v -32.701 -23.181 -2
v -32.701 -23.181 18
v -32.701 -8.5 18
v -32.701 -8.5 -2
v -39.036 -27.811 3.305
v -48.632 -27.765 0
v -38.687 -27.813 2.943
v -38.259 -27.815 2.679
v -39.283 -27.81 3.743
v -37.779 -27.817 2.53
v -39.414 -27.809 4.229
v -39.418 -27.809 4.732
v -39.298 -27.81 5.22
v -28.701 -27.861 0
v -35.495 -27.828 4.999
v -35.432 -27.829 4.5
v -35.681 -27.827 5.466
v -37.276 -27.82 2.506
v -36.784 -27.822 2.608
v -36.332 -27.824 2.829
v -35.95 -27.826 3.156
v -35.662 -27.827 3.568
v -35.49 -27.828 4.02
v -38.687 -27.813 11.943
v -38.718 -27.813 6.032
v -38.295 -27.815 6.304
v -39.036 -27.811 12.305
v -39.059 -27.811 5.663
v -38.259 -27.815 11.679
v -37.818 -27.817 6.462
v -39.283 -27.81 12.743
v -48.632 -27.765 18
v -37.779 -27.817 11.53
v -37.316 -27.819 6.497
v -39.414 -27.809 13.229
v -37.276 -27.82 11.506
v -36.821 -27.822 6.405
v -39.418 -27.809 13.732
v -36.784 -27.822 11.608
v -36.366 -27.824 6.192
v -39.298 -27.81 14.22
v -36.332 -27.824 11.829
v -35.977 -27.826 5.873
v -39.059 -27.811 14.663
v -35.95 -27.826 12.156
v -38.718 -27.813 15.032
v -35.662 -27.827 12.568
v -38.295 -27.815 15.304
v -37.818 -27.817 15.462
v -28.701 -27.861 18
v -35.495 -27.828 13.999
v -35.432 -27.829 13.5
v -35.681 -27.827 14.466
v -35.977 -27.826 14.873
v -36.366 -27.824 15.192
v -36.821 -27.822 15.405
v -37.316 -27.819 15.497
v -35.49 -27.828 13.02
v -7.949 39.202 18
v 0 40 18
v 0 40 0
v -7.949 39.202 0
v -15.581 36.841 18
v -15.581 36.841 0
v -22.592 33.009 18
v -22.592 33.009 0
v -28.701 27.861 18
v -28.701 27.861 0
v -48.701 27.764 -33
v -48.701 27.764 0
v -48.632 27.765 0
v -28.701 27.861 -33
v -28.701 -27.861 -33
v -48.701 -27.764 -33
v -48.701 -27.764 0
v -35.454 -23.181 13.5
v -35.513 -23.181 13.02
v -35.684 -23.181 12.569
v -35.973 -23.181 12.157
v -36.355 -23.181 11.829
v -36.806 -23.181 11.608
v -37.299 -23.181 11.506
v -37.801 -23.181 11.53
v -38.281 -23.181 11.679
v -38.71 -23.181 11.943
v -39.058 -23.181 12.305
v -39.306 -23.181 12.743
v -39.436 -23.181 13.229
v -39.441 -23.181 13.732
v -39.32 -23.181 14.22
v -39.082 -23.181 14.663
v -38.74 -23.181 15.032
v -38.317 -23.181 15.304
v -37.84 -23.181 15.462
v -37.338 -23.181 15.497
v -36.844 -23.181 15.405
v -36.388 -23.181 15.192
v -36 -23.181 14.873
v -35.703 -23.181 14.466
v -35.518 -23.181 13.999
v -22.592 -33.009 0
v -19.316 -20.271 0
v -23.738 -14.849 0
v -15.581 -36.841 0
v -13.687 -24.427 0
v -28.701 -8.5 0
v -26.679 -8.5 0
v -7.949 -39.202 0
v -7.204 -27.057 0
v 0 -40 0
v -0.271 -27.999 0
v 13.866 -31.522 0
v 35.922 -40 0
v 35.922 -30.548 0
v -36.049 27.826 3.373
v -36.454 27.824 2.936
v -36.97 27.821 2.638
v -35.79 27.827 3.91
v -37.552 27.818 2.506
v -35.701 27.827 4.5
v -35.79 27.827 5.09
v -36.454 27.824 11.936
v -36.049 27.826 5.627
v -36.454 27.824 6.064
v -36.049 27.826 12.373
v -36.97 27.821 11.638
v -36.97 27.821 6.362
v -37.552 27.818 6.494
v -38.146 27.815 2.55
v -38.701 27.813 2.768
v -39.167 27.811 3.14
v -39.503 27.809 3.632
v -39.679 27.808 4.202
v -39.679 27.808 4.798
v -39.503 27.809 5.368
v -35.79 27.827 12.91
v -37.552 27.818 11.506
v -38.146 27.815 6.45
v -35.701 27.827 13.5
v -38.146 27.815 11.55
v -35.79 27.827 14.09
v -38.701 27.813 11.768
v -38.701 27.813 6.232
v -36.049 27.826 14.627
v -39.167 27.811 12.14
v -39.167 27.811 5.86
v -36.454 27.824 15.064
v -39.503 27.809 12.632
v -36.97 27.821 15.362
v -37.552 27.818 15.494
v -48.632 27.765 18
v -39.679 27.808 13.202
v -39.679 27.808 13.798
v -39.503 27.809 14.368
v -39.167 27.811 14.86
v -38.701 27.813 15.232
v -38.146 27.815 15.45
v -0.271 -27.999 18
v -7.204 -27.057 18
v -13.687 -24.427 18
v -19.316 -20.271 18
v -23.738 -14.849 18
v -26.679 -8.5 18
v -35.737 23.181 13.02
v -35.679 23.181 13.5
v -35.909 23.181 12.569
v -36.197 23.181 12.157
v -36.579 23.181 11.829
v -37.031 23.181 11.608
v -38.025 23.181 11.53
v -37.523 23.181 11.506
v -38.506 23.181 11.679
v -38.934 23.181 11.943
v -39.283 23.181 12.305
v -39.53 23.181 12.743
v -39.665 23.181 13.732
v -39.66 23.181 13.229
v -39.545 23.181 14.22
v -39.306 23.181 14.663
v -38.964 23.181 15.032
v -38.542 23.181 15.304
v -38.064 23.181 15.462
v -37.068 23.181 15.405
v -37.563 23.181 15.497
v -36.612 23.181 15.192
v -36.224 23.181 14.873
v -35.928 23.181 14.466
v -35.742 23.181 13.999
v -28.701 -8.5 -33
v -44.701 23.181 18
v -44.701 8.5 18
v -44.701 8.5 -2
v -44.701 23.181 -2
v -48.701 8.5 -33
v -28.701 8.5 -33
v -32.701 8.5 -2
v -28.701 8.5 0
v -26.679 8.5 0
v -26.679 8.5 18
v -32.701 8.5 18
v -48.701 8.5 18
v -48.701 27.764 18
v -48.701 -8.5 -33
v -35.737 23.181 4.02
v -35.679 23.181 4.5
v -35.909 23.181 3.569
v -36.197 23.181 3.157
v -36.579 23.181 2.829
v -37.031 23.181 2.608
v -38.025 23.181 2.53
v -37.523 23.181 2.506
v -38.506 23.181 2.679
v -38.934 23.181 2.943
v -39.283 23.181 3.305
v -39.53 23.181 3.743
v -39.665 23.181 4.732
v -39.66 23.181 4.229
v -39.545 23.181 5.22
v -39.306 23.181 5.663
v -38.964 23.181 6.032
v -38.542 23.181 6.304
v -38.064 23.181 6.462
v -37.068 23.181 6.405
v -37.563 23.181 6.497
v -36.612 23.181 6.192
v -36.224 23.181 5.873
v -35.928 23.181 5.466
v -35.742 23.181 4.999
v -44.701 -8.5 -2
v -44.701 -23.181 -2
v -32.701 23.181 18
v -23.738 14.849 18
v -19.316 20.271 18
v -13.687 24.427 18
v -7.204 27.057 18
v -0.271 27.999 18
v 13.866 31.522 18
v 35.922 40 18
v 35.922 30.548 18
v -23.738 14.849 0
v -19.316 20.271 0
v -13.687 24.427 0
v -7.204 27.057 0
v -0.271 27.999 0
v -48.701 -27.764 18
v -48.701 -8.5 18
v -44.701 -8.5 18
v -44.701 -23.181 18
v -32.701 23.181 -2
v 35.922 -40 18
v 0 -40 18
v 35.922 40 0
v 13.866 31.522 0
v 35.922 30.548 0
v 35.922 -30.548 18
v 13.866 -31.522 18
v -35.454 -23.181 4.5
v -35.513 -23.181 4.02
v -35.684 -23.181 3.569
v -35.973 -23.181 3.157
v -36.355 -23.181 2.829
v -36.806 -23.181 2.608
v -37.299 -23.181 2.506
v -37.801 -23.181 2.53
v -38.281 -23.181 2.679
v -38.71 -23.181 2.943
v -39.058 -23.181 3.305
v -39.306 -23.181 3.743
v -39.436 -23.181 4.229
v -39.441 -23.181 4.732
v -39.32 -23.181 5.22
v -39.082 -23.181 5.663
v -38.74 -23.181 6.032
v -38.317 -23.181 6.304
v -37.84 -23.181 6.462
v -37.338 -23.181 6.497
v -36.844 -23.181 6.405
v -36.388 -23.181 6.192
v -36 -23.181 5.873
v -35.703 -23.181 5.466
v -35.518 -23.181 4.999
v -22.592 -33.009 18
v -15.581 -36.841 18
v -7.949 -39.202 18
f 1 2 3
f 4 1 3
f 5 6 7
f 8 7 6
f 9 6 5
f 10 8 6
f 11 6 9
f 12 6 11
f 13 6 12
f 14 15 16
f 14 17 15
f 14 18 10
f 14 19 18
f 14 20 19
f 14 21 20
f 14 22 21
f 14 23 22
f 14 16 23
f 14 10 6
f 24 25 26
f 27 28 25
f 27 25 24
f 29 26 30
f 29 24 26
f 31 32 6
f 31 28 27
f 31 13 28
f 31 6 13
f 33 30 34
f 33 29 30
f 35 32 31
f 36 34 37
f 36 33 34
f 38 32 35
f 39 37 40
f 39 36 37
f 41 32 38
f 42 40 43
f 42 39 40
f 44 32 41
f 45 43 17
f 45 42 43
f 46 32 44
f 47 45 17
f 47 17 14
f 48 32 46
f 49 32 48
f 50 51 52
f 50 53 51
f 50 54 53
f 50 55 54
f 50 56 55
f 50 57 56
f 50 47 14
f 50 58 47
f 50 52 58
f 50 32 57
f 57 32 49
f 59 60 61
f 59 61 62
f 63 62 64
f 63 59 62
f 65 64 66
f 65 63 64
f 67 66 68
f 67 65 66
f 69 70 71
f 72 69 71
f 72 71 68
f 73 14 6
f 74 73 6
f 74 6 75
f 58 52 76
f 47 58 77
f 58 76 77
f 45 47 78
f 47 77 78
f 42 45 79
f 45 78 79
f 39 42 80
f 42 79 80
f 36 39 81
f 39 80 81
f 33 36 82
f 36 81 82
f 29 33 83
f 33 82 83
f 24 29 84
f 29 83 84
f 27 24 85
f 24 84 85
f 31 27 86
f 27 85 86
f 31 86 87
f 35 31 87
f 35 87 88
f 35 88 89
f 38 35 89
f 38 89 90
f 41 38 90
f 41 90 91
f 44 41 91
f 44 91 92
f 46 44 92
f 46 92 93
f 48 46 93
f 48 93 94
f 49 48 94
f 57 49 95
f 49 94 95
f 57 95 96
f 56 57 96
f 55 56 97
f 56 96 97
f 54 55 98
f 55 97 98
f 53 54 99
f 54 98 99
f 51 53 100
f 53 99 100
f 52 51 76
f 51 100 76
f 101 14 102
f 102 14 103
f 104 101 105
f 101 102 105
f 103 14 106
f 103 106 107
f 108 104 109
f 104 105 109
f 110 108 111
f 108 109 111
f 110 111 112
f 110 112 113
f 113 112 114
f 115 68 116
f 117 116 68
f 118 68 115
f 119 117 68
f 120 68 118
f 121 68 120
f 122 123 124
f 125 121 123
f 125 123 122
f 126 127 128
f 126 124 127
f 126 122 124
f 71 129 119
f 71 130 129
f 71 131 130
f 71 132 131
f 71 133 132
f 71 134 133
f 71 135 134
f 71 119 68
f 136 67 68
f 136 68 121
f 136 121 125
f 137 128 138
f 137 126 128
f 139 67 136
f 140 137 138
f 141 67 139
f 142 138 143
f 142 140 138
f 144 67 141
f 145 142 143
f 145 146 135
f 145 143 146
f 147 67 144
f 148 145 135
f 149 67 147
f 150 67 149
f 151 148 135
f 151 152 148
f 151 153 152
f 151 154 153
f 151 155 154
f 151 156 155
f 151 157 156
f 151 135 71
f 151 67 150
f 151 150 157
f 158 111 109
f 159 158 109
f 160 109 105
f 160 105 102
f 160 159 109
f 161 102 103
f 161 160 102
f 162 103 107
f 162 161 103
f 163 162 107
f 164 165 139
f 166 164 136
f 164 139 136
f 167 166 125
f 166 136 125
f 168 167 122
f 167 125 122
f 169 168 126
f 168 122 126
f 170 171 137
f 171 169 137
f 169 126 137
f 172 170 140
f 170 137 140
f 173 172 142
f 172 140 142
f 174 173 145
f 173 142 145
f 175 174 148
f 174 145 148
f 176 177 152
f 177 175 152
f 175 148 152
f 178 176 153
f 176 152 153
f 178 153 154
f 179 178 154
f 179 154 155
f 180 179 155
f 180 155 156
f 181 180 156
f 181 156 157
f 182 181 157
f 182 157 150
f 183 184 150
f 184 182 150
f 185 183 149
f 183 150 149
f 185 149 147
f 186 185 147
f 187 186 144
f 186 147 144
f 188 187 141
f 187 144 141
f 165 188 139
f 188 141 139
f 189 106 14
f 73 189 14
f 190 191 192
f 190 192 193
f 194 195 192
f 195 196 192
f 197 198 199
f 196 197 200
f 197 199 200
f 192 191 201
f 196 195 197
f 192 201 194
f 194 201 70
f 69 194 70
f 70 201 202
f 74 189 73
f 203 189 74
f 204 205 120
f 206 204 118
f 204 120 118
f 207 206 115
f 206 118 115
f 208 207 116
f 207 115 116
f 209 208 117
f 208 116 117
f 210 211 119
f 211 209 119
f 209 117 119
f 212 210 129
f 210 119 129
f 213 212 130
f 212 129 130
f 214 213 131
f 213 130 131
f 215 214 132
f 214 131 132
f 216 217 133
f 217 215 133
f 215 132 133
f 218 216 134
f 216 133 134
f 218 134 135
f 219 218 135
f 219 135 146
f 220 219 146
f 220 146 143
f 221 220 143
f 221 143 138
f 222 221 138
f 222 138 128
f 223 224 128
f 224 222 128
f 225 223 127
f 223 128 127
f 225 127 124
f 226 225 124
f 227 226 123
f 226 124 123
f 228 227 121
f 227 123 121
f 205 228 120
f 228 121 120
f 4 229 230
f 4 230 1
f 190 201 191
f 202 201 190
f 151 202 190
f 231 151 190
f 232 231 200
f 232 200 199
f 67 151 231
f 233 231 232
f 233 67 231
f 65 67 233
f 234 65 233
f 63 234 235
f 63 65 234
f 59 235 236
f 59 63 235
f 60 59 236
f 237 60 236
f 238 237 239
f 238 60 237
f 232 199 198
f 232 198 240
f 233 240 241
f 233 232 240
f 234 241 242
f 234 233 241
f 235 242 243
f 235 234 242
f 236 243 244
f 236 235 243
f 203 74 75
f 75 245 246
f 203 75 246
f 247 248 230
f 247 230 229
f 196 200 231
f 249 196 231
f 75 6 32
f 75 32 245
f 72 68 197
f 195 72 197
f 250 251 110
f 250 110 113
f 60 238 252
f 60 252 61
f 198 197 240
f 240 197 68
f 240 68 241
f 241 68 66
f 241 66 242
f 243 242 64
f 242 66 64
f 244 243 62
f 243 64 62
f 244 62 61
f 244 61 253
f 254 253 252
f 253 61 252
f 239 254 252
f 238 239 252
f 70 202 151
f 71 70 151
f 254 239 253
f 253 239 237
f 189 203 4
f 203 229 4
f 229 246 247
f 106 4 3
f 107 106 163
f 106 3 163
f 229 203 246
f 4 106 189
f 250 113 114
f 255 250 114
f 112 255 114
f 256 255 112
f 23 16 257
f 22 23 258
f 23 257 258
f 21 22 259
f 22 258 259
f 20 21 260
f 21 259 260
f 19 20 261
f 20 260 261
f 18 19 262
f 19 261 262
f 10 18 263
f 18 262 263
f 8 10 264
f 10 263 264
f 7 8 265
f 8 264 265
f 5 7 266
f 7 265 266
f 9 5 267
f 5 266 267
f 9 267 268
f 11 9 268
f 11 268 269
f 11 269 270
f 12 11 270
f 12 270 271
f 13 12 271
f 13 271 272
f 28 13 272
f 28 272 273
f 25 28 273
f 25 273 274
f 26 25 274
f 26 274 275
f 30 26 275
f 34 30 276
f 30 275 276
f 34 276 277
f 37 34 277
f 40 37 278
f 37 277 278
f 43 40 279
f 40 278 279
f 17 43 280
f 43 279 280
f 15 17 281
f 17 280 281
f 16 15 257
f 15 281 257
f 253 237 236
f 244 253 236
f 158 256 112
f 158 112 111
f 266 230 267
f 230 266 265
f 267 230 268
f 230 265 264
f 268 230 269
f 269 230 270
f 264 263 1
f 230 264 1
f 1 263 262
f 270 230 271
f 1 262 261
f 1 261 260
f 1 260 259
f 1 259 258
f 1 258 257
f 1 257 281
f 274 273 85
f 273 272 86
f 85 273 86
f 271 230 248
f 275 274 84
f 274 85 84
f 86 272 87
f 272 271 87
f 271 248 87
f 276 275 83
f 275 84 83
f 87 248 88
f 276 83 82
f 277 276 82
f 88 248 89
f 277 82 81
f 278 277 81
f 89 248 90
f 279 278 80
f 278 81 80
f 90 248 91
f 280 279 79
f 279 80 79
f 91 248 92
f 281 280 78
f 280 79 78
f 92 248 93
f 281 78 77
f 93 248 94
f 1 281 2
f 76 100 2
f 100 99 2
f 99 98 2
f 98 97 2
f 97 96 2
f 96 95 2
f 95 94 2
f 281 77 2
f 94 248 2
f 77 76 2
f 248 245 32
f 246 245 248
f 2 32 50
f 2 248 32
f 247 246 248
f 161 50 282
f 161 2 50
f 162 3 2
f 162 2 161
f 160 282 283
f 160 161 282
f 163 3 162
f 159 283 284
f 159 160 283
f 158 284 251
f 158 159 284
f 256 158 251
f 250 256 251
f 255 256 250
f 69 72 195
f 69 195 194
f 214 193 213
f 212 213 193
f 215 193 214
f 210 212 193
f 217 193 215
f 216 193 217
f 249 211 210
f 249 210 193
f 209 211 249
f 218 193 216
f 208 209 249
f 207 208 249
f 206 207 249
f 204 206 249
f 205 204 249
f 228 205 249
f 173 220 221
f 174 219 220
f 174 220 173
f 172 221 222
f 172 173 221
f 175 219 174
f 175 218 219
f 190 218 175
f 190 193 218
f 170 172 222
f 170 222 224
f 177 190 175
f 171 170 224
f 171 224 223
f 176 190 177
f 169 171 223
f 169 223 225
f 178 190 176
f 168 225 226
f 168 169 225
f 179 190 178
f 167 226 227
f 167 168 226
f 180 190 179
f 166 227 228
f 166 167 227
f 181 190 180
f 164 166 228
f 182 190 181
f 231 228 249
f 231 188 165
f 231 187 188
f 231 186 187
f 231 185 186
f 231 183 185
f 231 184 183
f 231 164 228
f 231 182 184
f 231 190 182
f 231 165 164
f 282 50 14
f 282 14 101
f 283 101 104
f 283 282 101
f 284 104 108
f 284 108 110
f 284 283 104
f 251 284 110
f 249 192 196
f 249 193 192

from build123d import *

# Parameters (mm, degrees)
BOSS_EXTRUDE1_DEPTH   = 18
BOSS_EXTRUDE1_2_DEPTH = 18
SKETCH3_R             = 2
CUT_EXTRUDE2_DEPTH    = 55
BOSS_EXTRUDE3_DEPTH   = 8
SKETCH6_W             = 20
SKETCH6_H             = 4
BOSS_EXTRUDE4_DEPTH   = 8
BOSS_EXTRUDE5_DEPTH   = 33
BOSS_EXTRUDE6_DEPTH   = 18
CUT_EXTRUDE3_DEPTH    = 18
FILLET1_R             = 5
CUT_EXTRUDE4_DEPTH    = 18
BOSS_EXTRUDE7_DEPTH   = 18
CUT_EXTRUDE6_DEPTH    = 18
CUT_EXTRUDE8_DEPTH    = 51
BOSS_EXTRUDE9_DEPTH   = 33
CUT_EXTRUDE9_DEPTH    = 51
SKETCH24_W            = 12
SKETCH24_H            = 10
CUT_EXTRUDE13_DEPTH   = 20
CUT_EXTRUDE14_REACH   = 70.173
SKETCH27_R            = 2
SKETCH28_W            = 12
SKETCH28_H            = 26.361153364
CUT_EXTRUDE15_DEPTH   = 20
CUT_EXTRUDE16_DEPTH   = 18


with BuildPart() as part:
    # Sketch1 → Boss-Extrude1 (new body)
    with BuildSketch(Plane.XY):
        with BuildLine():
            ThreePointArc((-67.970581872, 8.5), (-45.332107827, 51.354162441), (0, 68.5))
            Line((0, 68.5), (60, 68.5))
            Line((60, 68.5), (60, 83.5))
            Line((60, 83.5), (0, 83.5))
            ThreePointArc((0, 83.5), (-46.291853863, 69.493267774), (-77.053226258, 32.172197985))
            ThreePointArc((-77.053226258, 32.172197985), (-79.853331001, 28.774985947), (-84.067123478, 27.5))
            Line((-84.067123478, 27.5), (-103.3555905, 27.5))
            Line((-103.3555905, 27.5), (-103.3555905, 21.5))
            Line((-103.3555905, 21.5), (-83.3555905, 21.5))
            Line((-83.3555905, 21.5), (-83.3555905, 13.5))
            Line((-83.3555905, 13.5), (-103.3555905, 13.5))
            Line((-103.3555905, 13.5), (-103.3555905, 8.5))
            Line((-103.3555905, 8.5), (-67.970581872, 8.5))
        make_face()
    extrude(amount=BOSS_EXTRUDE1_DEPTH)


with BuildPart() as body_2:
    # Sketch1 → Boss-Extrude1 2 (new body)
    with BuildSketch(Plane.XY):
        with BuildLine():
            ThreePointArc((-77.053226258, -32.172197985), (-46.291853863, -69.493267774), (0, -83.5))
            Line((0, -83.5), (60, -83.5))
            Line((60, -83.5), (60, -68.5))
            Line((60, -68.5), (0, -68.5))
            ThreePointArc((0, -68.5), (-45.332107827, -51.354162441), (-67.970581872, -8.5))
            Line((-67.970581872, -8.5), (-103.3555905, -8.5))
            Line((-103.3555905, -8.5), (-103.3555905, -13.5))
            Line((-103.3555905, -13.5), (-83.3555905, -13.5))
            Line((-83.3555905, -13.5), (-83.3555905, -21.5))
            Line((-83.3555905, -21.5), (-103.3555905, -21.5))
            Line((-103.3555905, -21.5), (-103.3555905, -27.5))
            Line((-103.3555905, -27.5), (-84.067123478, -27.5))
            ThreePointArc((-84.067123478, -27.5), (-79.853331001, -28.774985947), (-77.053226258, -32.172197985))
        make_face()
    extrude(amount=BOSS_EXTRUDE1_2_DEPTH)


with BuildPart() as cut_extrude2_tool:
    # Sketch3 → Cut-Extrude2 (new body)
    with BuildSketch(Plane.XZ.offset(27.5)):
        with Locations((-88.567123478, 9)):
            Circle(SKETCH3_R)
        with Locations((-97.567123478, 9)):
            Circle(SKETCH3_R)
    extrude(amount=-CUT_EXTRUDE2_DEPTH)


with BuildPart() as part_1:
    add(part.part)

    # Cut-Extrude2: cut by cut_extrude2_tool
    add(cut_extrude2_tool.part, mode=Mode.SUBTRACT)

    # Sketch5 → Boss-Extrude3 (add)
    with BuildSketch(Plane.XZ.offset(-21.5)):
        Polygon((-103.3555905, 14), (-84.067123478, 14), (-83.3555905, 14), (-83.3555905, 18), (-103.3555905, 18), align=None)
        Polygon((-103.3555905, 4), (-103.3555905, 0), (-84.067123478, 0), (-83.3555905, 0), (-83.3555905, 4), (-84.067123478, 4), align=None)
    extrude(amount=BOSS_EXTRUDE3_DEPTH)



with BuildPart() as body_2_1:
    add(body_2.part)

    # Cut-Extrude2: cut by cut_extrude2_tool
    add(cut_extrude2_tool.part, mode=Mode.SUBTRACT)

    # Sketch6 → Boss-Extrude4 (add)
    with BuildSketch(Plane(origin=(0, -13.5, 0), x_dir=(-1, 0, 0), z_dir=(0, -1, 0))):
        with Locations((93.3555905, -16)):
            Rectangle(SKETCH6_W, SKETCH6_H)
        with Locations((93.3555905, -2)):
            Rectangle(SKETCH6_W, SKETCH6_H)
    extrude(amount=BOSS_EXTRUDE4_DEPTH)


with BuildPart() as part_2:
    add(part_1.part)

    add(body_2_1.part)  # Boss-Extrude5 merges body 2
    # Sketch7 → Boss-Extrude5 (add)
    with BuildSketch(Plane(origin=(0, 0, 0), x_dir=(-1, 0, 0), z_dir=(0, 0, -1))):
        with BuildLine():
            Line((67.970581872, -8.5), (103.3555905, -8.5))
            Line((103.3555905, -8.5), (103.3555905, -27.5))
            Line((103.3555905, -27.5), (62.737548565, -27.5))
            ThreePointArc((62.737548565, -27.5), (66.040925498, -18.189176985), (67.970581872, -8.5))
        make_face()
        with BuildLine():
            Line((103.3555905, 27.5), (62.737548565, 27.5))
            ThreePointArc((62.737548565, 27.5), (66.040925498, 18.189176985), (67.970581872, 8.5))
            Line((67.970581872, 8.5), (103.3555905, 8.5))
            Line((103.3555905, 8.5), (103.3555905, 27.5))
        make_face()
    extrude(amount=BOSS_EXTRUDE5_DEPTH)

    # Sketch9 → Boss-Extrude6 (add)
    with BuildSketch(Plane.XY.offset(18)):
        with BuildLine():
            Line((-67.970581872, 8.5), (-53.326822519, 8.5))
            ThreePointArc((-53.326822519, 8.5), (-35.049964337, 41.079191813), (0, 54))
            Line((0, 54), (60, 54))
            Line((60, 54), (60, 68.5))
            Line((60, 68.5), (0, 68.5))
            ThreePointArc((0, 68.5), (-45.332107827, 51.354162441), (-67.970581872, 8.5))
        make_face()
        with BuildLine():
            Line((0, -54), (60, -54))
            Line((60, -54), (60, -68.5))
            Line((60, -68.5), (0, -68.5))
            ThreePointArc((0, -68.5), (-45.332107827, -51.354162441), (-67.970581872, -8.5))
            Line((-67.970581872, -8.5), (-53.326822519, -8.5))
            ThreePointArc((-53.326822519, -8.5), (-35.049964337, -41.079191813), (0, -54))
        make_face()
    extrude(amount=-BOSS_EXTRUDE6_DEPTH)

    # Sketch10 → Cut-Extrude3 (cut)
    with BuildSketch(Plane.XY.offset(18)):
        with BuildLine():
            ThreePointArc((0, 83.5), (-46.291853863, 69.493267774), (-77.053226258, 32.172197985))
            Line((-77.053226258, 32.172197985), (-66.08479157, 32.172197985))
            ThreePointArc((-66.08479157, 32.172197985), (-38.971742635, 62.317359347), (0, 73.5))
            Line((0, 73.5), (50, 73.5))
            Line((50, 73.5), (60, 73.5))
            Line((60, 73.5), (60, 83.5))
            Line((60, 83.5), (0, 83.5))
        make_face()
        with BuildLine():
            Line((0, -83.5), (60, -83.5))
            Line((60, -83.5), (60, -73.5))
            Line((60, -73.5), (50, -73.5))
            Line((50, -73.5), (0, -73.5))
            ThreePointArc((0, -73.5), (-38.971742635, -62.317359347), (-66.08479157, -32.172197985))
            Line((-66.08479157, -32.172197985), (-77.053226258, -32.172197985))
            ThreePointArc((-77.053226258, -32.172197985), (-46.291853863, -69.493267774), (0, -83.5))
        make_face()
        with BuildLine():
            Line((0, -56), (60, -56))
            Line((60, -56), (60, -54))
            Line((60, -54), (0, -54))
            ThreePointArc((0, -54), (-35.049964337, -41.079191813), (-53.326822519, -8.5))
            Line((-53.326822519, -8.5), (-55.35115175, -8.5))
            ThreePointArc((-55.35115175, -8.5), (-36.469165058, -42.497058722), (0, -56))
        make_face()
        with BuildLine():
            Line((60, 54), (60, 56))
            Line((60, 56), (0, 56))
            ThreePointArc((0, 56), (-36.469165058, 42.497058722), (-55.35115175, 8.5))
            Line((-55.35115175, 8.5), (-53.326822519, 8.5))
            ThreePointArc((-53.326822519, 8.5), (-35.049964337, 41.079191813), (0, 54))
            Line((0, 54), (60, 54))
        make_face()
    extrude(amount=-CUT_EXTRUDE3_DEPTH, mode=Mode.SUBTRACT)

    # Fillet1
    fillet1_edges = [part_2.edges().sort_by_distance(p)[0] for p in [
        (-77.053226258, 32.172197985, 9),
    ]]
    fillet(fillet1_edges, radius=FILLET1_R)

    # Sketch12 → Cut-Extrude4 (cut)
    with BuildSketch(Plane.XY.offset(18)):
        with BuildLine():
            ThreePointArc((-84.067123478, 27.5), (-74.733138383, 28.516658422), (-66.08479157, 32.172197985))
            Line((-66.08479157, 32.172197985), (-74.273414579, 32.172197985))
            ThreePointArc((-74.273414579, 32.172197985), (-76.4262848, 31.684974271), (-78.159583252, 30.318257909))
            ThreePointArc((-78.159583252, 30.318257909), (-80.794448382, 28.24065074), (-84.067123478, 27.5))
        make_face()
        with BuildLine():
            ThreePointArc((-84.067123478, -27.5), (-74.733138383, -28.516658422), (-66.08479157, -32.172197985))
            Line((-66.08479157, -32.172197985), (-77.053226258, -32.172197985))
            ThreePointArc((-77.053226258, -32.172197985), (-79.853331001, -28.774985947), (-84.067123478, -27.5))
        make_face()
    extrude(amount=-CUT_EXTRUDE4_DEPTH, mode=Mode.SUBTRACT)

    # Sketch13 → Boss-Extrude7 (add)
    with BuildSketch(Plane.XY.offset(18)):
        with BuildLine():
            ThreePointArc((-0.27090305, 27.998689461), (-0.13545311, 27.999672363), (0, 28))
            Line((0, 28), (35.921954013, 28))
            Line((35.921954013, 28), (35.921954013, 40))
            Line((35.921954013, 40), (0, 40))
            ThreePointArc((0, 40), (-15.581300739, 36.84050851), (-28.701152124, 27.861153364))
            Line((-28.701152124, 27.861153364), (-59.086442662, 27.714159426))
            Line((-59.086442662, 27.714159426), (-59.086442662, 8.5))
            Line((-59.086442662, 8.5), (-39.086442662, 8.5))
            Line((-39.086442662, 8.5), (-26.678643144, 8.5))
            ThreePointArc((-26.678643144, 8.5), (-16.631873998, 22.525114146), (-0.27090305, 27.998689461))
        make_face()
        with BuildLine():
            Line((35.921954013, -28), (0, -28))
            ThreePointArc((0, -28), (-0.13545311, -27.999672363), (-0.27090305, -27.998689461))
            ThreePointArc((-0.27090305, -27.998689461), (-16.631873998, -22.525114146), (-26.678643144, -8.5))
            Line((-26.678643144, -8.5), (-39.086442662, -8.5))
            Line((-39.086442662, -8.5), (-55.35115175, -8.5))
            ThreePointArc((-55.35115175, -8.5), (-52.876575307, -18.44092687), (-48.632495811, -27.764732147))
            Line((-48.632495811, -27.764732147), (-28.701152124, -27.861153364))
            ThreePointArc((-28.701152124, -27.861153364), (-15.581300739, -36.84050851), (0, -40))
            Line((0, -40), (35.921954013, -40))
            Line((35.921954013, -40), (35.921954013, -28))
        make_face()
    extrude(amount=-BOSS_EXTRUDE7_DEPTH)

    # Sketch14 → Cut-Extrude6 (cut)
    with BuildSketch(Plane.XY.offset(18)):
        with BuildLine():
            Line((60, -40), (0, -40))
            ThreePointArc((0, -40), (-15.581300739, -36.84050851), (-28.701152124, -27.861153364))
            Line((-28.701152124, -27.861153364), (-103.3555905, -27.5))
            Line((-103.3555905, -27.5), (-103.3555905, -78.529731722))
            Line((-103.3555905, -78.529731722), (60, -73.5))
            Line((60, -73.5), (60, -40))
        make_face()
        with BuildLine():
            Line((0, 40), (76.426770392, 40))
            Line((76.426770392, 40), (76.426770392, 83.735898263))
            Line((76.426770392, 83.735898263), (-103.3555905, 83.735898263))
            Line((-103.3555905, 83.735898263), (-103.3555905, 27.5))
            Line((-103.3555905, 27.5), (-28.701152124, 27.861153364))
            ThreePointArc((-28.701152124, 27.861153364), (-15.581300739, 36.84050851), (0, 40))
        make_face()
    extrude(amount=-CUT_EXTRUDE6_DEPTH, mode=Mode.SUBTRACT)

    # Sketch16 → Cut-Extrude8 (cut)
    with BuildSketch(Plane.XY.offset(18)):
        Polygon((-96.511114913, -8.5), (-48.701152124, -8.5), (-48.701152124, 27.76440001), (-96.511114913, 27.533111298), align=None)
        with BuildLine():
            Line((-59.086442662, -27.714159426), (-48.701152124, -27.76440001))
            Line((-48.701152124, -27.76440001), (-48.701152124, -8.5))
            Line((-48.701152124, -8.5), (-96.511114913, -8.5))
            Line((-96.511114913, -8.5), (-96.511114913, -27.5))
            Line((-96.511114913, -27.5), (-84.067123478, -27.5))
            ThreePointArc((-84.067123478, -27.5), (-81.983393161, -27.489607176), (-79.903320582, -27.613454288))
            Line((-79.903320582, -27.613454288), (-59.086442662, -27.714159426))
        make_face()
    extrude(amount=-CUT_EXTRUDE8_DEPTH, mode=Mode.SUBTRACT)

    # Sketch17 → Boss-Extrude9 (add)
    with BuildSketch(Plane(origin=(0, 0, 0), x_dir=(-1, 0, 0), z_dir=(0, 0, -1))):
        Polygon((48.701152124, 8.5), (48.701152124, 27.76440001), (28.701152124, 27.861153364), (28.701152124, 8.5), align=None)
        Polygon((48.701152124, -8.5), (28.701152124, -8.5), (28.701152124, -27.861153364), (48.701152124, -27.76440001), align=None)
    extrude(amount=BOSS_EXTRUDE9_DEPTH)

    # Sketch18 → Cut-Extrude9 (cut)
    with BuildSketch(Plane.XY.offset(18)):
        Polygon((-48.701152124, 27.76440001), (-116.673009187, 35.475699467), (-116.673009187, -41.632003062), (-48.701152124, -27.76440001), align=None)
    extrude(amount=-CUT_EXTRUDE9_DEPTH, mode=Mode.SUBTRACT)

    # Sketch24 → Cut-Extrude13 (cut)
    with BuildSketch(Plane.XY.offset(18)):
        with Locations((-38.701152124, -18.180576682)):
            Rectangle(SKETCH24_W, SKETCH24_H)
        with Locations((-38.701152124, 18.180576682)):
            Rectangle(SKETCH24_W, SKETCH24_H)
    extrude(amount=-CUT_EXTRUDE13_DEPTH, mode=Mode.SUBTRACT)

    # Cut-Extrude14: up to this face of the body (flat: up to its plane)
    cut_extrude14_end = Plane(part_2.part.faces().sort_by_distance((-38.701152124, -27.812776687, -7.5))[0])
    # Sketch27 → Cut-Extrude14 (cut, up to the picked face)
    with BuildSketch(Plane(origin=(-0.135451525, 27.999344731, 0), x_dir=(0.999988299, 0.004837611, 0), z_dir=(-0.004837611, 0.999988299, 0)), mode=Mode.PRIVATE) as cut_extrude14_sk1:
        with Locations((-37.566034859, -13.5)):
            Circle(SKETCH27_R)
    cut_extrude14_tool1 = split(extrude(cut_extrude14_sk1.sketch, amount=-CUT_EXTRUDE14_REACH, mode=Mode.PRIVATE), bisect_by=cut_extrude14_end, keep=Keep.BOTH, mode=Mode.PRIVATE)
    add(cut_extrude14_tool1.solids().sort_by_distance((-37.701047, 27.817615, 13.5))[0], mode=Mode.SUBTRACT)
    # Sketch27 → Cut-Extrude14 (cut, up to the picked face)
    with BuildSketch(Plane(origin=(-0.135451525, 27.999344731, 0), x_dir=(0.999988299, 0.004837611, 0), z_dir=(-0.004837611, 0.999988299, 0)), mode=Mode.PRIVATE) as cut_extrude14_sk2:
        with Locations((-37.566034859, -4.5)):
            Circle(SKETCH27_R)
    cut_extrude14_tool2 = split(extrude(cut_extrude14_sk2.sketch, amount=-CUT_EXTRUDE14_REACH, mode=Mode.PRIVATE), bisect_by=cut_extrude14_end, keep=Keep.BOTH, mode=Mode.PRIVATE)
    add(cut_extrude14_tool2.solids().sort_by_distance((-37.701047, 27.817615, 4.5))[0], mode=Mode.SUBTRACT)

    # Sketch28 → Cut-Extrude15 (cut)
    with BuildSketch(Plane.XY.offset(18)):
        with Locations((-38.701152124, 0)):
            Rectangle(SKETCH28_W, SKETCH28_H)
    extrude(amount=-CUT_EXTRUDE15_DEPTH, mode=Mode.SUBTRACT)

    # Sketch29 → Cut-Extrude16 (cut)
    with BuildSketch(Plane.XY.offset(18)):
        Polygon((35.921954013, 28), (35.921954013, 30.548024479), (13.866014887, 31.522263692), (-0.27090305, 27.998689461), align=None)
        Polygon((35.921954013, -28), (35.921954013, -30.548024479), (13.866014887, -31.522263692), (-0.27090305, -27.998689461), align=None)
    extrude(amount=-CUT_EXTRUDE16_DEPTH, mode=Mode.SUBTRACT)


solid = part_2.part
